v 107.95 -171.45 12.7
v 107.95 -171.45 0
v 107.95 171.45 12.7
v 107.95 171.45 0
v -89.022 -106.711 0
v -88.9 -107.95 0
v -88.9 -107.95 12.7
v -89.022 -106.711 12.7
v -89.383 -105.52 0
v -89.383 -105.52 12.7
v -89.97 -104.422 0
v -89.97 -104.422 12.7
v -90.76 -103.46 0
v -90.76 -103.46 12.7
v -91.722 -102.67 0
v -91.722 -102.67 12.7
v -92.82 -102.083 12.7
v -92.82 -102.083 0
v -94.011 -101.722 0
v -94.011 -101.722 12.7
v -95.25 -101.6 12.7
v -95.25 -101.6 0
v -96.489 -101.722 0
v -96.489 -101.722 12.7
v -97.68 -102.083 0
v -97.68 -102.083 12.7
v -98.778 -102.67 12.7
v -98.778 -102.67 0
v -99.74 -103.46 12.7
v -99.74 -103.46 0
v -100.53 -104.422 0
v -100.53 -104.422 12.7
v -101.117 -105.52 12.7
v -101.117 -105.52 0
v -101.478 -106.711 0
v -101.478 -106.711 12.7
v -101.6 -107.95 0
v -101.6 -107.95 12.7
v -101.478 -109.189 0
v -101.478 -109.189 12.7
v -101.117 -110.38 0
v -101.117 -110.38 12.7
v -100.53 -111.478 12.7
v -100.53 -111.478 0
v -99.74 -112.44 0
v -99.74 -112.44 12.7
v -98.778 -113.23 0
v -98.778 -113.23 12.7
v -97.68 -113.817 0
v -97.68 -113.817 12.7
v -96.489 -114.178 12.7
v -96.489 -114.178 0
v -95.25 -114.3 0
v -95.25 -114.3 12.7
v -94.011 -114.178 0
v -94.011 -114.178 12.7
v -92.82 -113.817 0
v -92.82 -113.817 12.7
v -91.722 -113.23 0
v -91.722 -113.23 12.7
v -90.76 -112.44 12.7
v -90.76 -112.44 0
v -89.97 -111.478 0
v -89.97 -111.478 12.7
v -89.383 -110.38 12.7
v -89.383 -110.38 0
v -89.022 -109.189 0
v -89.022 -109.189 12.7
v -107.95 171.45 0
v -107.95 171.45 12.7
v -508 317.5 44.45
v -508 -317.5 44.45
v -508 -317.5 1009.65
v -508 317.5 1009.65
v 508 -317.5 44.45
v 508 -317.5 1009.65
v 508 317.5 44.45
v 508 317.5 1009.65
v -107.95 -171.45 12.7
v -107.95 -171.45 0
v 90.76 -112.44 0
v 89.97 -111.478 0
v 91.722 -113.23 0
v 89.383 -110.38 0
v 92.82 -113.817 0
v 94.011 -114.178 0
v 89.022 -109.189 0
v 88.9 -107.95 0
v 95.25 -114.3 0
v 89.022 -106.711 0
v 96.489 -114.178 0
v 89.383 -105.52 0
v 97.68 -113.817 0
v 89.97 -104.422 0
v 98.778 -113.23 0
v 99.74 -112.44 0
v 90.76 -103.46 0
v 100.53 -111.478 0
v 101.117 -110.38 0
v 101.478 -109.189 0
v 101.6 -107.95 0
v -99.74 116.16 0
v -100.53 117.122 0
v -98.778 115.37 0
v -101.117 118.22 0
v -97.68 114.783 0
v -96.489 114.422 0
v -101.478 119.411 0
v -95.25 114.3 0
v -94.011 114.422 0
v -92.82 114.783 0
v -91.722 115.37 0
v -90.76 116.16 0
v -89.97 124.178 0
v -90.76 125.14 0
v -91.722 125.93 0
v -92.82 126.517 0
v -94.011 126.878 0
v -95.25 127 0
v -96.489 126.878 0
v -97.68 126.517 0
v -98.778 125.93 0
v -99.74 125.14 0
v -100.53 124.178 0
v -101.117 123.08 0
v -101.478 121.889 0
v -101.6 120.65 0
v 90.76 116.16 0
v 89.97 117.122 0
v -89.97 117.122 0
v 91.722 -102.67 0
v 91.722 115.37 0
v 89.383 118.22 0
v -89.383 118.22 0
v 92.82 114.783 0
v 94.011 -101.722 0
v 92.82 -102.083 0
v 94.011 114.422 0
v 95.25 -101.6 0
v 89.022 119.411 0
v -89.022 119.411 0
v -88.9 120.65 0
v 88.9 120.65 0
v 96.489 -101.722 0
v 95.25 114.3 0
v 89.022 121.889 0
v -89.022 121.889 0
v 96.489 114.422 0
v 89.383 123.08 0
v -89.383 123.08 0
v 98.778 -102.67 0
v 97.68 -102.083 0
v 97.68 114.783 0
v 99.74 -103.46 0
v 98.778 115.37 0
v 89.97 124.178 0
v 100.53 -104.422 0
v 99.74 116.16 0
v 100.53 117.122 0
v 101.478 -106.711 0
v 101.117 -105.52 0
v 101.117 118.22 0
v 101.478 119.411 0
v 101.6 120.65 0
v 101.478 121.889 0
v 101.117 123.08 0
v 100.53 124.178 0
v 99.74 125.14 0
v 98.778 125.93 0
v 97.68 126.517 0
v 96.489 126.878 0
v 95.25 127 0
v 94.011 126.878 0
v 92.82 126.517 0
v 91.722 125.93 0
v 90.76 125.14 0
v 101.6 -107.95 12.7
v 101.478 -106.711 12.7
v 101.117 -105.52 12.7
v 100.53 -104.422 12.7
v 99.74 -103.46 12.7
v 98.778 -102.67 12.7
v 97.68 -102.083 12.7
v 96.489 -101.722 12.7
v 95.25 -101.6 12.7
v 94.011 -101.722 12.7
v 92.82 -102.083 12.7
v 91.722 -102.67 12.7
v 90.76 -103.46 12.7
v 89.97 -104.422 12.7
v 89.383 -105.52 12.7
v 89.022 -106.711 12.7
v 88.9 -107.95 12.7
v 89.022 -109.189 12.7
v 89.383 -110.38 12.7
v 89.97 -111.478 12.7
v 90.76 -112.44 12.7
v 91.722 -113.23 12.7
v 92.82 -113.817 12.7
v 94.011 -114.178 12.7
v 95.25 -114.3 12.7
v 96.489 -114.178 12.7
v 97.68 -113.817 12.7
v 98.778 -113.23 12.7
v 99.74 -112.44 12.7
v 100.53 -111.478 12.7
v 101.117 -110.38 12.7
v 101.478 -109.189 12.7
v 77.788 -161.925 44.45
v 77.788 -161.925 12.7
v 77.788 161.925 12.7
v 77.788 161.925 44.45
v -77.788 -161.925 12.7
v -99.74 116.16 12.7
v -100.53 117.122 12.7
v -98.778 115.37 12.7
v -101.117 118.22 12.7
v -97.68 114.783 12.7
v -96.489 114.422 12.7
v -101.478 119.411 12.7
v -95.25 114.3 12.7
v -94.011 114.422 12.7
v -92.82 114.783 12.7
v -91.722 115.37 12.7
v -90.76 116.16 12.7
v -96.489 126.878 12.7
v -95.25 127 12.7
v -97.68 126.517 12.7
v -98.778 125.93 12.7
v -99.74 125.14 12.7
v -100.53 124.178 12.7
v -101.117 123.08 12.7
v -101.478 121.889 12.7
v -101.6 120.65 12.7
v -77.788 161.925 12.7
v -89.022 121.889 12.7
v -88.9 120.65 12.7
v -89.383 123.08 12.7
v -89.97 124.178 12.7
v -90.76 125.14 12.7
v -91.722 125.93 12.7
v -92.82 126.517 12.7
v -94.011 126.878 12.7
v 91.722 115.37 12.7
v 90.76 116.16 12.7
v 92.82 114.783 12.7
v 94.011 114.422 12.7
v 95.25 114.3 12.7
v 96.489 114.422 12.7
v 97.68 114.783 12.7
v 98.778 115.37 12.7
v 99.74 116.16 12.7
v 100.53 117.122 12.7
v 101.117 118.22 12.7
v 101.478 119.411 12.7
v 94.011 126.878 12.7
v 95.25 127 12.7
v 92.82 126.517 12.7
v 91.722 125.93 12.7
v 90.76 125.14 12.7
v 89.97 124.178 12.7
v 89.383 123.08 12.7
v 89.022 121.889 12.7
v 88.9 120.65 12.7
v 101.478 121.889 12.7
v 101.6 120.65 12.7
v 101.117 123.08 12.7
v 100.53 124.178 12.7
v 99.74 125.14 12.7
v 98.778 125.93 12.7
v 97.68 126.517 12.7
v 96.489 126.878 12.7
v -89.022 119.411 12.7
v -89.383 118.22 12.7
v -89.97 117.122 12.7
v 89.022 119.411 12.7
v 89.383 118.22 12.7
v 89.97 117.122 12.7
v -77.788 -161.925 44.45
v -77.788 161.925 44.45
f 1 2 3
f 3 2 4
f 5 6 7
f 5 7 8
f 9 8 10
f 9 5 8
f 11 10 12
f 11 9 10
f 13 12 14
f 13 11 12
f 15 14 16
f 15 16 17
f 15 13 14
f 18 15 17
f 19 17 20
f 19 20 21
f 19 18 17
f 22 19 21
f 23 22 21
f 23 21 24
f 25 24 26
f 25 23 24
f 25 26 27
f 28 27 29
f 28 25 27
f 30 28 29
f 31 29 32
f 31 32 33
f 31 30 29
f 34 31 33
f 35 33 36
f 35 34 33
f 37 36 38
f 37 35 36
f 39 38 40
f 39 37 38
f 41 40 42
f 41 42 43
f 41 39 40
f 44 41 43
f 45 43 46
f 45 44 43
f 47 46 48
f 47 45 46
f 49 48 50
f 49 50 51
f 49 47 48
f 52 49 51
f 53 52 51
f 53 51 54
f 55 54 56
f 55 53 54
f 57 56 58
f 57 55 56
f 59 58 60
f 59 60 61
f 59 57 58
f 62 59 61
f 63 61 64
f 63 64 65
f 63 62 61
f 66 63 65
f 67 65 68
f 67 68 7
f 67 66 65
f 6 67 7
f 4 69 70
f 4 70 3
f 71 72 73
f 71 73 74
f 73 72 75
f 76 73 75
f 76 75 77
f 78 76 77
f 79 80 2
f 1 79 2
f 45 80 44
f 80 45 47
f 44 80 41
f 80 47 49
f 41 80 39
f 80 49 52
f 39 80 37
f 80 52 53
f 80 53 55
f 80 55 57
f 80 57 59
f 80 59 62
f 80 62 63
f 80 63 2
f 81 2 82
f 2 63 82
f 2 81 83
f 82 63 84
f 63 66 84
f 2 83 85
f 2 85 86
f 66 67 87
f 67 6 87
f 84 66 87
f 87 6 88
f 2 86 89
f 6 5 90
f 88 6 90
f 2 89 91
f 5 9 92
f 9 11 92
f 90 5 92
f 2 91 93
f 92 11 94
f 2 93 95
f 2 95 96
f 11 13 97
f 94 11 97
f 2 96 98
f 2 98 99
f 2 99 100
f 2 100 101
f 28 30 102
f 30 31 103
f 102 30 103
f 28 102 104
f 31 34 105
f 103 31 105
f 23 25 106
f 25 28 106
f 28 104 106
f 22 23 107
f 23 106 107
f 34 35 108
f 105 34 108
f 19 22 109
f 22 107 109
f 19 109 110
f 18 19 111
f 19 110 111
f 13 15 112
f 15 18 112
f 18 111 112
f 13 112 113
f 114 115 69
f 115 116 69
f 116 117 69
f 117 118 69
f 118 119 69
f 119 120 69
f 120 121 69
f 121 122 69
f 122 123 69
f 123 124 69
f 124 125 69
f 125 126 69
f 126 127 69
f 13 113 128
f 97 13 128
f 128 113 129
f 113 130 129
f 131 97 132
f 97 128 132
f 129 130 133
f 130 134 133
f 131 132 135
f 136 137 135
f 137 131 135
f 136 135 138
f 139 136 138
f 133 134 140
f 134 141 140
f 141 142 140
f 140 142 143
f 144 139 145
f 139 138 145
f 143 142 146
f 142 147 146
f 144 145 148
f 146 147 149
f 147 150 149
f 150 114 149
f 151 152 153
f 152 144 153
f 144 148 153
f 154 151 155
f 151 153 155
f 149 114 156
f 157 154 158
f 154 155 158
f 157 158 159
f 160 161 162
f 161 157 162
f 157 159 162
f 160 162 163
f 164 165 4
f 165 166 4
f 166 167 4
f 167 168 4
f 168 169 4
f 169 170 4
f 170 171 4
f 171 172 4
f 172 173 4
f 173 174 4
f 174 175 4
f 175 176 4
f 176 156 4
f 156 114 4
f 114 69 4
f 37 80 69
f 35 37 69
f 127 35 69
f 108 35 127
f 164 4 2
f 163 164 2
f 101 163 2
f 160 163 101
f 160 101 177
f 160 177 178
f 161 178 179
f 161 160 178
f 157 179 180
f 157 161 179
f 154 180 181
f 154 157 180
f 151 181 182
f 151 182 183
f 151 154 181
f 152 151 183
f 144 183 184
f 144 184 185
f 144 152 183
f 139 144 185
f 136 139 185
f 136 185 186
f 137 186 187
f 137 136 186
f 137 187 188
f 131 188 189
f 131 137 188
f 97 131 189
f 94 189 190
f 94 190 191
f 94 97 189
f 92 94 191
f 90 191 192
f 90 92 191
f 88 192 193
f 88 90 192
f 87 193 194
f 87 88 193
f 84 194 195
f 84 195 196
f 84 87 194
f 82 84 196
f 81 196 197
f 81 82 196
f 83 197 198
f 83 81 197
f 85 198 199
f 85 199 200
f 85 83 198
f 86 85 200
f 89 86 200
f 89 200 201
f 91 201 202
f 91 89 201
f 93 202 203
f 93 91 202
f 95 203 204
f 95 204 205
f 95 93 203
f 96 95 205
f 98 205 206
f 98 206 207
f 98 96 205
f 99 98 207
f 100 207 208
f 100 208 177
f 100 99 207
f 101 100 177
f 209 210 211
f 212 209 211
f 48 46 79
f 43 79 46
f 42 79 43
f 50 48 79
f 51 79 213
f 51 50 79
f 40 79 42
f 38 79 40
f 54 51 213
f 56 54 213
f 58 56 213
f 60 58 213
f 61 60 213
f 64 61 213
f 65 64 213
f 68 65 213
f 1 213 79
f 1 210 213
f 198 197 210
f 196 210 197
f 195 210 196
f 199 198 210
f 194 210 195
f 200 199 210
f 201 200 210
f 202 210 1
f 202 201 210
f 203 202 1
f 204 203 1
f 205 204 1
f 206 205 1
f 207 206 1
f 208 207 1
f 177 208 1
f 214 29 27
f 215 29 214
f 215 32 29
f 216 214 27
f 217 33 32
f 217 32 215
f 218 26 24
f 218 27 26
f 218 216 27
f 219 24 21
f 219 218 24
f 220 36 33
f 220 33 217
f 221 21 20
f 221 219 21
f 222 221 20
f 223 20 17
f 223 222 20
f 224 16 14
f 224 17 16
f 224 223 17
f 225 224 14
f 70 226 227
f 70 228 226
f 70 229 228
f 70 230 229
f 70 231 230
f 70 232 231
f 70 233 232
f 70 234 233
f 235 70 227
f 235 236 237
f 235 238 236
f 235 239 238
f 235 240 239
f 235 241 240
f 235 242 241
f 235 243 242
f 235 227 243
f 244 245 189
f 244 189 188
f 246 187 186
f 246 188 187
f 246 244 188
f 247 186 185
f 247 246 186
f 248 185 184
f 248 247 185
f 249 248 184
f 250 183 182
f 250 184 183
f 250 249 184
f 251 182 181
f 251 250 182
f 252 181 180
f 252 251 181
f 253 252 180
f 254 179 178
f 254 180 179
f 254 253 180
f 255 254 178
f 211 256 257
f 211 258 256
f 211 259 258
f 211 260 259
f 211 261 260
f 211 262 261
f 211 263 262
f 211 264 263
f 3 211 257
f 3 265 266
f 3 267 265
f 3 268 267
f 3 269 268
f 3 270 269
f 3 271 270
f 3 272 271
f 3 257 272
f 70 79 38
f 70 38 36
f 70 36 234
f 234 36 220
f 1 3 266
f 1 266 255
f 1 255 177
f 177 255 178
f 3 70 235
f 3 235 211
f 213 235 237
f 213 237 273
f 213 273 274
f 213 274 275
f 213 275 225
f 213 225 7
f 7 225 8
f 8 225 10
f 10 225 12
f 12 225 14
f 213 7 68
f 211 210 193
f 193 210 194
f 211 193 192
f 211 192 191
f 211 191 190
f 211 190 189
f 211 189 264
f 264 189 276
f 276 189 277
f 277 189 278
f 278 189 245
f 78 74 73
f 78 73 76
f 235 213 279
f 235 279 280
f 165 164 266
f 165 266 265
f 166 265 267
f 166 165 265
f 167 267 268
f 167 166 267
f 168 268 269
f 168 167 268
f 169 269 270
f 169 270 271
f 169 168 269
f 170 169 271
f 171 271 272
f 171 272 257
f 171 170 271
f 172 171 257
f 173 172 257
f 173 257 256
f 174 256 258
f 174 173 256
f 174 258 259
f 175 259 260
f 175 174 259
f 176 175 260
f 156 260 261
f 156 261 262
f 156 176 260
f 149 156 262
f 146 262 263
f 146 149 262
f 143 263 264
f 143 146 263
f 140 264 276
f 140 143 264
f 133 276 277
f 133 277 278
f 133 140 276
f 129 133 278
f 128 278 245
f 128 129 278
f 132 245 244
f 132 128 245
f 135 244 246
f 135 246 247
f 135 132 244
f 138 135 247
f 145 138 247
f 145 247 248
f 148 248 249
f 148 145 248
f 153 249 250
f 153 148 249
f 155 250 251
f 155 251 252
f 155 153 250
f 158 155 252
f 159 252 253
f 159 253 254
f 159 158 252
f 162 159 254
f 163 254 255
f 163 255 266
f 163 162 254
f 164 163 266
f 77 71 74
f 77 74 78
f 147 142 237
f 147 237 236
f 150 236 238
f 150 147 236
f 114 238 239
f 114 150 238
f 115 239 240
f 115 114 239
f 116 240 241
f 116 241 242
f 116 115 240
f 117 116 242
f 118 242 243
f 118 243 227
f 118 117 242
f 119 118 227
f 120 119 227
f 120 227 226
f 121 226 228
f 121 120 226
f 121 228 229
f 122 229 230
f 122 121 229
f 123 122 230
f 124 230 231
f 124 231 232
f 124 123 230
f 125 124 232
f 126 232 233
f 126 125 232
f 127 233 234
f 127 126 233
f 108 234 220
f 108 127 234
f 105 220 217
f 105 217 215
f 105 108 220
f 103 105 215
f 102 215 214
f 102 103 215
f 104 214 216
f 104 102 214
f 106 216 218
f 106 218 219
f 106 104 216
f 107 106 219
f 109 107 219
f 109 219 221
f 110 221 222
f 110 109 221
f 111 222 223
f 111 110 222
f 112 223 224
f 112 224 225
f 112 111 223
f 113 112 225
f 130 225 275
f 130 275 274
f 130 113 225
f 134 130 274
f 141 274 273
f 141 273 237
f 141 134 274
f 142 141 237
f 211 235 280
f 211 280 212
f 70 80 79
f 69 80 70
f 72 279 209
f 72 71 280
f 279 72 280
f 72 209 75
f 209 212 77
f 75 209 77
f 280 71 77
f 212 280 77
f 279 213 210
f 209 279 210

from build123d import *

# Parameters (mm, degrees)
F0_W     = 215.9
F0_H     = 342.9
F0_R     = 6.35
F1_DEPTH = 12.7
F2_W     = 155.575
F2_H     = 323.85
F3_DEPTH = 44.45
F4_W     = 1016
F4_H     = 635
F5_DEPTH = 965.2


with BuildPart() as f1:
    # F0 (on Top) → F1 (new body)
    with BuildSketch(Plane.XY):
        Rectangle(F0_W, F0_H)
        with Locations((-95.25, -107.95)):
            Circle(F0_R, mode=Mode.SUBTRACT)
        with Locations((95.25, -107.95)):
            Circle(F0_R, mode=Mode.SUBTRACT)
        with Locations((-95.25, 120.65)):
            Circle(F0_R, mode=Mode.SUBTRACT)
        with Locations((95.25, 120.65)):
            Circle(F0_R, mode=Mode.SUBTRACT)
    extrude(amount=F1_DEPTH)

    # F2 (on face) → F3 (join)
    with BuildSketch(Plane.XY):
        Rectangle(F2_W, F2_H)
    extrude(amount=F3_DEPTH)

    # F4 (on face) → F5 (join)
    with BuildSketch(Plane.XY.offset(44.45)):
        Rectangle(F4_W, F4_H)
    extrude(amount=F5_DEPTH)


solid = f1.part
